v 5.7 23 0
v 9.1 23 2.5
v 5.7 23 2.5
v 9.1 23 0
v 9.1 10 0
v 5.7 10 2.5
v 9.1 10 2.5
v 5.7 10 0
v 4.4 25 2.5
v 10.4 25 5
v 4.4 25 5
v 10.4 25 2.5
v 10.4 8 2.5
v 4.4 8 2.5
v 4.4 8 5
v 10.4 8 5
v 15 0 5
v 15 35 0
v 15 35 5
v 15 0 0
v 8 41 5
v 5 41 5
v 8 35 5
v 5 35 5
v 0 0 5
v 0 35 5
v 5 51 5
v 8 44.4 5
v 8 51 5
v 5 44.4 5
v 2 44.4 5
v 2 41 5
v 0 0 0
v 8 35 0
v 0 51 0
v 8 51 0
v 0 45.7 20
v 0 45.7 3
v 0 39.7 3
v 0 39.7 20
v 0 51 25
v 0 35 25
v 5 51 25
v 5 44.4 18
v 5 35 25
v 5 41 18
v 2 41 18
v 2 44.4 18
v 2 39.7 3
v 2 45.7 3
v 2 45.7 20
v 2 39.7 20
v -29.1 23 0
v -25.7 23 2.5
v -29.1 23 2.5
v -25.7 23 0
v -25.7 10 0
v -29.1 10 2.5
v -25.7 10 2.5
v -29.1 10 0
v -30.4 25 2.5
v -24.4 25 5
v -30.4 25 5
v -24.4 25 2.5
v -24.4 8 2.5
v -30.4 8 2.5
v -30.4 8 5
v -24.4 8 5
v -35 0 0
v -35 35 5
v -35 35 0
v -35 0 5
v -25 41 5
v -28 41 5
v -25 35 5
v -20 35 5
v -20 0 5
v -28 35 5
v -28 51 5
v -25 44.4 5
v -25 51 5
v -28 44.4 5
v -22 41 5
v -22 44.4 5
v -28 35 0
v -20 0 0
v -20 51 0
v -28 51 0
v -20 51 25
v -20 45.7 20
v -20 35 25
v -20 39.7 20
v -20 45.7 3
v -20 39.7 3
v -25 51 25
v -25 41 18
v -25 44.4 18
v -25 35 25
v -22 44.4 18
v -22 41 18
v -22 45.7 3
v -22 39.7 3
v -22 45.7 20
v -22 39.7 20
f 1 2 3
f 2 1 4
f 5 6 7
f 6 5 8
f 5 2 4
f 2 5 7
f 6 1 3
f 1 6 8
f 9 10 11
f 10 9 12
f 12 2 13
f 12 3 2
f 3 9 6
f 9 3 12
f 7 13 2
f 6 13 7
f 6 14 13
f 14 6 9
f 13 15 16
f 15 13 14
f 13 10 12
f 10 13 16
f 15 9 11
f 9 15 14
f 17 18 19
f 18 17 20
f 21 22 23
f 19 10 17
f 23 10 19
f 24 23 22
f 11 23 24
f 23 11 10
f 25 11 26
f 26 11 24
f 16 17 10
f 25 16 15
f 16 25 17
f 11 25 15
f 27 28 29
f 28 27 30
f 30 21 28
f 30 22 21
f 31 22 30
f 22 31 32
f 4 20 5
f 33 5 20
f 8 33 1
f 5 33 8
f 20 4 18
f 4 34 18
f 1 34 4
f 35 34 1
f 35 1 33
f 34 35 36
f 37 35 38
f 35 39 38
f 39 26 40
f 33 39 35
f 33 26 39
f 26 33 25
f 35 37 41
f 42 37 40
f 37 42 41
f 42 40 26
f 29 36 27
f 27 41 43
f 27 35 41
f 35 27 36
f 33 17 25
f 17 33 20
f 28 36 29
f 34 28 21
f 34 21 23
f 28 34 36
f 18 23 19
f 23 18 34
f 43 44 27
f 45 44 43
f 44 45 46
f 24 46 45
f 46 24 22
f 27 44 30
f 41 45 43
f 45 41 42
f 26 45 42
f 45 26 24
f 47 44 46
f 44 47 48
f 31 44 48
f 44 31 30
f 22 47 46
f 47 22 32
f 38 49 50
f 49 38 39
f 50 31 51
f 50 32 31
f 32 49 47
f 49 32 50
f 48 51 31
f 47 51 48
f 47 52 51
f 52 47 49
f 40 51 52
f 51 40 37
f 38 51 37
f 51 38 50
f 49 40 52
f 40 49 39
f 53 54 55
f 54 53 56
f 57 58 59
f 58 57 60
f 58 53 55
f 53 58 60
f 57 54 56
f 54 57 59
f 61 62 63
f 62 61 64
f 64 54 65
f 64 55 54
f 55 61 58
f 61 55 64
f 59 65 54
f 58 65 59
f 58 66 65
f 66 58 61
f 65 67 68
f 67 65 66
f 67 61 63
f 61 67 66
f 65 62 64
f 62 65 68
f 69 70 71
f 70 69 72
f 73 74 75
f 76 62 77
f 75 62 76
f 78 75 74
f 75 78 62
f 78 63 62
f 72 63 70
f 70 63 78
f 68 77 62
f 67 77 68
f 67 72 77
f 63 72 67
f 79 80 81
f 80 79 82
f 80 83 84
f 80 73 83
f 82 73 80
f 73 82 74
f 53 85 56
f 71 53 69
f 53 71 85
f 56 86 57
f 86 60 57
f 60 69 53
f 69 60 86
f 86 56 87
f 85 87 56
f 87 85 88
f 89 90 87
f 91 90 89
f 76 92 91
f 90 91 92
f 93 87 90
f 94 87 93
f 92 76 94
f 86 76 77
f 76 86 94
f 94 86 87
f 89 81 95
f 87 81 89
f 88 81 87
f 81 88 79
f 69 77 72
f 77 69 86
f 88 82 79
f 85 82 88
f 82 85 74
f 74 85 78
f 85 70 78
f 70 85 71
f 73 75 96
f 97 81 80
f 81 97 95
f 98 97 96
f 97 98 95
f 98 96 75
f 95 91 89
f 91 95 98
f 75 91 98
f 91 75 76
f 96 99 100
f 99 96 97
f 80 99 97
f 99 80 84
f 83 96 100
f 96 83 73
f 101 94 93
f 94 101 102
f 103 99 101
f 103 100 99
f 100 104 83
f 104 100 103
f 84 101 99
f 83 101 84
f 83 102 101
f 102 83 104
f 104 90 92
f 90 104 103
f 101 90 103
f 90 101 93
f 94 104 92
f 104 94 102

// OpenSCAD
$fn = 100;
clearance = 0.2;

holder();
mirror([1,0,0])translate([20,0,0])holder();

module holder(){
    difference(){
        union(){
            //floor
            difference(){
                cube([15,51,5]);
                rotate([180,0,90])translate([10,5.7,-5.5])adjustableBolt();
                translate([8,35,-1])cube([11,17,20]);
            }
            //wall
            translate([0,35,0])cube([5,16,25]);
        }
        rotate([0,90,0])translate([-18,41,-1])adjustableBolt();
    }
    
}
module adjustableBolt(){
    union(){
        cube([13,3.2+clearance,25]);
        translate([-2,-1.3,0])cube([17,6,3]);
    }
}
